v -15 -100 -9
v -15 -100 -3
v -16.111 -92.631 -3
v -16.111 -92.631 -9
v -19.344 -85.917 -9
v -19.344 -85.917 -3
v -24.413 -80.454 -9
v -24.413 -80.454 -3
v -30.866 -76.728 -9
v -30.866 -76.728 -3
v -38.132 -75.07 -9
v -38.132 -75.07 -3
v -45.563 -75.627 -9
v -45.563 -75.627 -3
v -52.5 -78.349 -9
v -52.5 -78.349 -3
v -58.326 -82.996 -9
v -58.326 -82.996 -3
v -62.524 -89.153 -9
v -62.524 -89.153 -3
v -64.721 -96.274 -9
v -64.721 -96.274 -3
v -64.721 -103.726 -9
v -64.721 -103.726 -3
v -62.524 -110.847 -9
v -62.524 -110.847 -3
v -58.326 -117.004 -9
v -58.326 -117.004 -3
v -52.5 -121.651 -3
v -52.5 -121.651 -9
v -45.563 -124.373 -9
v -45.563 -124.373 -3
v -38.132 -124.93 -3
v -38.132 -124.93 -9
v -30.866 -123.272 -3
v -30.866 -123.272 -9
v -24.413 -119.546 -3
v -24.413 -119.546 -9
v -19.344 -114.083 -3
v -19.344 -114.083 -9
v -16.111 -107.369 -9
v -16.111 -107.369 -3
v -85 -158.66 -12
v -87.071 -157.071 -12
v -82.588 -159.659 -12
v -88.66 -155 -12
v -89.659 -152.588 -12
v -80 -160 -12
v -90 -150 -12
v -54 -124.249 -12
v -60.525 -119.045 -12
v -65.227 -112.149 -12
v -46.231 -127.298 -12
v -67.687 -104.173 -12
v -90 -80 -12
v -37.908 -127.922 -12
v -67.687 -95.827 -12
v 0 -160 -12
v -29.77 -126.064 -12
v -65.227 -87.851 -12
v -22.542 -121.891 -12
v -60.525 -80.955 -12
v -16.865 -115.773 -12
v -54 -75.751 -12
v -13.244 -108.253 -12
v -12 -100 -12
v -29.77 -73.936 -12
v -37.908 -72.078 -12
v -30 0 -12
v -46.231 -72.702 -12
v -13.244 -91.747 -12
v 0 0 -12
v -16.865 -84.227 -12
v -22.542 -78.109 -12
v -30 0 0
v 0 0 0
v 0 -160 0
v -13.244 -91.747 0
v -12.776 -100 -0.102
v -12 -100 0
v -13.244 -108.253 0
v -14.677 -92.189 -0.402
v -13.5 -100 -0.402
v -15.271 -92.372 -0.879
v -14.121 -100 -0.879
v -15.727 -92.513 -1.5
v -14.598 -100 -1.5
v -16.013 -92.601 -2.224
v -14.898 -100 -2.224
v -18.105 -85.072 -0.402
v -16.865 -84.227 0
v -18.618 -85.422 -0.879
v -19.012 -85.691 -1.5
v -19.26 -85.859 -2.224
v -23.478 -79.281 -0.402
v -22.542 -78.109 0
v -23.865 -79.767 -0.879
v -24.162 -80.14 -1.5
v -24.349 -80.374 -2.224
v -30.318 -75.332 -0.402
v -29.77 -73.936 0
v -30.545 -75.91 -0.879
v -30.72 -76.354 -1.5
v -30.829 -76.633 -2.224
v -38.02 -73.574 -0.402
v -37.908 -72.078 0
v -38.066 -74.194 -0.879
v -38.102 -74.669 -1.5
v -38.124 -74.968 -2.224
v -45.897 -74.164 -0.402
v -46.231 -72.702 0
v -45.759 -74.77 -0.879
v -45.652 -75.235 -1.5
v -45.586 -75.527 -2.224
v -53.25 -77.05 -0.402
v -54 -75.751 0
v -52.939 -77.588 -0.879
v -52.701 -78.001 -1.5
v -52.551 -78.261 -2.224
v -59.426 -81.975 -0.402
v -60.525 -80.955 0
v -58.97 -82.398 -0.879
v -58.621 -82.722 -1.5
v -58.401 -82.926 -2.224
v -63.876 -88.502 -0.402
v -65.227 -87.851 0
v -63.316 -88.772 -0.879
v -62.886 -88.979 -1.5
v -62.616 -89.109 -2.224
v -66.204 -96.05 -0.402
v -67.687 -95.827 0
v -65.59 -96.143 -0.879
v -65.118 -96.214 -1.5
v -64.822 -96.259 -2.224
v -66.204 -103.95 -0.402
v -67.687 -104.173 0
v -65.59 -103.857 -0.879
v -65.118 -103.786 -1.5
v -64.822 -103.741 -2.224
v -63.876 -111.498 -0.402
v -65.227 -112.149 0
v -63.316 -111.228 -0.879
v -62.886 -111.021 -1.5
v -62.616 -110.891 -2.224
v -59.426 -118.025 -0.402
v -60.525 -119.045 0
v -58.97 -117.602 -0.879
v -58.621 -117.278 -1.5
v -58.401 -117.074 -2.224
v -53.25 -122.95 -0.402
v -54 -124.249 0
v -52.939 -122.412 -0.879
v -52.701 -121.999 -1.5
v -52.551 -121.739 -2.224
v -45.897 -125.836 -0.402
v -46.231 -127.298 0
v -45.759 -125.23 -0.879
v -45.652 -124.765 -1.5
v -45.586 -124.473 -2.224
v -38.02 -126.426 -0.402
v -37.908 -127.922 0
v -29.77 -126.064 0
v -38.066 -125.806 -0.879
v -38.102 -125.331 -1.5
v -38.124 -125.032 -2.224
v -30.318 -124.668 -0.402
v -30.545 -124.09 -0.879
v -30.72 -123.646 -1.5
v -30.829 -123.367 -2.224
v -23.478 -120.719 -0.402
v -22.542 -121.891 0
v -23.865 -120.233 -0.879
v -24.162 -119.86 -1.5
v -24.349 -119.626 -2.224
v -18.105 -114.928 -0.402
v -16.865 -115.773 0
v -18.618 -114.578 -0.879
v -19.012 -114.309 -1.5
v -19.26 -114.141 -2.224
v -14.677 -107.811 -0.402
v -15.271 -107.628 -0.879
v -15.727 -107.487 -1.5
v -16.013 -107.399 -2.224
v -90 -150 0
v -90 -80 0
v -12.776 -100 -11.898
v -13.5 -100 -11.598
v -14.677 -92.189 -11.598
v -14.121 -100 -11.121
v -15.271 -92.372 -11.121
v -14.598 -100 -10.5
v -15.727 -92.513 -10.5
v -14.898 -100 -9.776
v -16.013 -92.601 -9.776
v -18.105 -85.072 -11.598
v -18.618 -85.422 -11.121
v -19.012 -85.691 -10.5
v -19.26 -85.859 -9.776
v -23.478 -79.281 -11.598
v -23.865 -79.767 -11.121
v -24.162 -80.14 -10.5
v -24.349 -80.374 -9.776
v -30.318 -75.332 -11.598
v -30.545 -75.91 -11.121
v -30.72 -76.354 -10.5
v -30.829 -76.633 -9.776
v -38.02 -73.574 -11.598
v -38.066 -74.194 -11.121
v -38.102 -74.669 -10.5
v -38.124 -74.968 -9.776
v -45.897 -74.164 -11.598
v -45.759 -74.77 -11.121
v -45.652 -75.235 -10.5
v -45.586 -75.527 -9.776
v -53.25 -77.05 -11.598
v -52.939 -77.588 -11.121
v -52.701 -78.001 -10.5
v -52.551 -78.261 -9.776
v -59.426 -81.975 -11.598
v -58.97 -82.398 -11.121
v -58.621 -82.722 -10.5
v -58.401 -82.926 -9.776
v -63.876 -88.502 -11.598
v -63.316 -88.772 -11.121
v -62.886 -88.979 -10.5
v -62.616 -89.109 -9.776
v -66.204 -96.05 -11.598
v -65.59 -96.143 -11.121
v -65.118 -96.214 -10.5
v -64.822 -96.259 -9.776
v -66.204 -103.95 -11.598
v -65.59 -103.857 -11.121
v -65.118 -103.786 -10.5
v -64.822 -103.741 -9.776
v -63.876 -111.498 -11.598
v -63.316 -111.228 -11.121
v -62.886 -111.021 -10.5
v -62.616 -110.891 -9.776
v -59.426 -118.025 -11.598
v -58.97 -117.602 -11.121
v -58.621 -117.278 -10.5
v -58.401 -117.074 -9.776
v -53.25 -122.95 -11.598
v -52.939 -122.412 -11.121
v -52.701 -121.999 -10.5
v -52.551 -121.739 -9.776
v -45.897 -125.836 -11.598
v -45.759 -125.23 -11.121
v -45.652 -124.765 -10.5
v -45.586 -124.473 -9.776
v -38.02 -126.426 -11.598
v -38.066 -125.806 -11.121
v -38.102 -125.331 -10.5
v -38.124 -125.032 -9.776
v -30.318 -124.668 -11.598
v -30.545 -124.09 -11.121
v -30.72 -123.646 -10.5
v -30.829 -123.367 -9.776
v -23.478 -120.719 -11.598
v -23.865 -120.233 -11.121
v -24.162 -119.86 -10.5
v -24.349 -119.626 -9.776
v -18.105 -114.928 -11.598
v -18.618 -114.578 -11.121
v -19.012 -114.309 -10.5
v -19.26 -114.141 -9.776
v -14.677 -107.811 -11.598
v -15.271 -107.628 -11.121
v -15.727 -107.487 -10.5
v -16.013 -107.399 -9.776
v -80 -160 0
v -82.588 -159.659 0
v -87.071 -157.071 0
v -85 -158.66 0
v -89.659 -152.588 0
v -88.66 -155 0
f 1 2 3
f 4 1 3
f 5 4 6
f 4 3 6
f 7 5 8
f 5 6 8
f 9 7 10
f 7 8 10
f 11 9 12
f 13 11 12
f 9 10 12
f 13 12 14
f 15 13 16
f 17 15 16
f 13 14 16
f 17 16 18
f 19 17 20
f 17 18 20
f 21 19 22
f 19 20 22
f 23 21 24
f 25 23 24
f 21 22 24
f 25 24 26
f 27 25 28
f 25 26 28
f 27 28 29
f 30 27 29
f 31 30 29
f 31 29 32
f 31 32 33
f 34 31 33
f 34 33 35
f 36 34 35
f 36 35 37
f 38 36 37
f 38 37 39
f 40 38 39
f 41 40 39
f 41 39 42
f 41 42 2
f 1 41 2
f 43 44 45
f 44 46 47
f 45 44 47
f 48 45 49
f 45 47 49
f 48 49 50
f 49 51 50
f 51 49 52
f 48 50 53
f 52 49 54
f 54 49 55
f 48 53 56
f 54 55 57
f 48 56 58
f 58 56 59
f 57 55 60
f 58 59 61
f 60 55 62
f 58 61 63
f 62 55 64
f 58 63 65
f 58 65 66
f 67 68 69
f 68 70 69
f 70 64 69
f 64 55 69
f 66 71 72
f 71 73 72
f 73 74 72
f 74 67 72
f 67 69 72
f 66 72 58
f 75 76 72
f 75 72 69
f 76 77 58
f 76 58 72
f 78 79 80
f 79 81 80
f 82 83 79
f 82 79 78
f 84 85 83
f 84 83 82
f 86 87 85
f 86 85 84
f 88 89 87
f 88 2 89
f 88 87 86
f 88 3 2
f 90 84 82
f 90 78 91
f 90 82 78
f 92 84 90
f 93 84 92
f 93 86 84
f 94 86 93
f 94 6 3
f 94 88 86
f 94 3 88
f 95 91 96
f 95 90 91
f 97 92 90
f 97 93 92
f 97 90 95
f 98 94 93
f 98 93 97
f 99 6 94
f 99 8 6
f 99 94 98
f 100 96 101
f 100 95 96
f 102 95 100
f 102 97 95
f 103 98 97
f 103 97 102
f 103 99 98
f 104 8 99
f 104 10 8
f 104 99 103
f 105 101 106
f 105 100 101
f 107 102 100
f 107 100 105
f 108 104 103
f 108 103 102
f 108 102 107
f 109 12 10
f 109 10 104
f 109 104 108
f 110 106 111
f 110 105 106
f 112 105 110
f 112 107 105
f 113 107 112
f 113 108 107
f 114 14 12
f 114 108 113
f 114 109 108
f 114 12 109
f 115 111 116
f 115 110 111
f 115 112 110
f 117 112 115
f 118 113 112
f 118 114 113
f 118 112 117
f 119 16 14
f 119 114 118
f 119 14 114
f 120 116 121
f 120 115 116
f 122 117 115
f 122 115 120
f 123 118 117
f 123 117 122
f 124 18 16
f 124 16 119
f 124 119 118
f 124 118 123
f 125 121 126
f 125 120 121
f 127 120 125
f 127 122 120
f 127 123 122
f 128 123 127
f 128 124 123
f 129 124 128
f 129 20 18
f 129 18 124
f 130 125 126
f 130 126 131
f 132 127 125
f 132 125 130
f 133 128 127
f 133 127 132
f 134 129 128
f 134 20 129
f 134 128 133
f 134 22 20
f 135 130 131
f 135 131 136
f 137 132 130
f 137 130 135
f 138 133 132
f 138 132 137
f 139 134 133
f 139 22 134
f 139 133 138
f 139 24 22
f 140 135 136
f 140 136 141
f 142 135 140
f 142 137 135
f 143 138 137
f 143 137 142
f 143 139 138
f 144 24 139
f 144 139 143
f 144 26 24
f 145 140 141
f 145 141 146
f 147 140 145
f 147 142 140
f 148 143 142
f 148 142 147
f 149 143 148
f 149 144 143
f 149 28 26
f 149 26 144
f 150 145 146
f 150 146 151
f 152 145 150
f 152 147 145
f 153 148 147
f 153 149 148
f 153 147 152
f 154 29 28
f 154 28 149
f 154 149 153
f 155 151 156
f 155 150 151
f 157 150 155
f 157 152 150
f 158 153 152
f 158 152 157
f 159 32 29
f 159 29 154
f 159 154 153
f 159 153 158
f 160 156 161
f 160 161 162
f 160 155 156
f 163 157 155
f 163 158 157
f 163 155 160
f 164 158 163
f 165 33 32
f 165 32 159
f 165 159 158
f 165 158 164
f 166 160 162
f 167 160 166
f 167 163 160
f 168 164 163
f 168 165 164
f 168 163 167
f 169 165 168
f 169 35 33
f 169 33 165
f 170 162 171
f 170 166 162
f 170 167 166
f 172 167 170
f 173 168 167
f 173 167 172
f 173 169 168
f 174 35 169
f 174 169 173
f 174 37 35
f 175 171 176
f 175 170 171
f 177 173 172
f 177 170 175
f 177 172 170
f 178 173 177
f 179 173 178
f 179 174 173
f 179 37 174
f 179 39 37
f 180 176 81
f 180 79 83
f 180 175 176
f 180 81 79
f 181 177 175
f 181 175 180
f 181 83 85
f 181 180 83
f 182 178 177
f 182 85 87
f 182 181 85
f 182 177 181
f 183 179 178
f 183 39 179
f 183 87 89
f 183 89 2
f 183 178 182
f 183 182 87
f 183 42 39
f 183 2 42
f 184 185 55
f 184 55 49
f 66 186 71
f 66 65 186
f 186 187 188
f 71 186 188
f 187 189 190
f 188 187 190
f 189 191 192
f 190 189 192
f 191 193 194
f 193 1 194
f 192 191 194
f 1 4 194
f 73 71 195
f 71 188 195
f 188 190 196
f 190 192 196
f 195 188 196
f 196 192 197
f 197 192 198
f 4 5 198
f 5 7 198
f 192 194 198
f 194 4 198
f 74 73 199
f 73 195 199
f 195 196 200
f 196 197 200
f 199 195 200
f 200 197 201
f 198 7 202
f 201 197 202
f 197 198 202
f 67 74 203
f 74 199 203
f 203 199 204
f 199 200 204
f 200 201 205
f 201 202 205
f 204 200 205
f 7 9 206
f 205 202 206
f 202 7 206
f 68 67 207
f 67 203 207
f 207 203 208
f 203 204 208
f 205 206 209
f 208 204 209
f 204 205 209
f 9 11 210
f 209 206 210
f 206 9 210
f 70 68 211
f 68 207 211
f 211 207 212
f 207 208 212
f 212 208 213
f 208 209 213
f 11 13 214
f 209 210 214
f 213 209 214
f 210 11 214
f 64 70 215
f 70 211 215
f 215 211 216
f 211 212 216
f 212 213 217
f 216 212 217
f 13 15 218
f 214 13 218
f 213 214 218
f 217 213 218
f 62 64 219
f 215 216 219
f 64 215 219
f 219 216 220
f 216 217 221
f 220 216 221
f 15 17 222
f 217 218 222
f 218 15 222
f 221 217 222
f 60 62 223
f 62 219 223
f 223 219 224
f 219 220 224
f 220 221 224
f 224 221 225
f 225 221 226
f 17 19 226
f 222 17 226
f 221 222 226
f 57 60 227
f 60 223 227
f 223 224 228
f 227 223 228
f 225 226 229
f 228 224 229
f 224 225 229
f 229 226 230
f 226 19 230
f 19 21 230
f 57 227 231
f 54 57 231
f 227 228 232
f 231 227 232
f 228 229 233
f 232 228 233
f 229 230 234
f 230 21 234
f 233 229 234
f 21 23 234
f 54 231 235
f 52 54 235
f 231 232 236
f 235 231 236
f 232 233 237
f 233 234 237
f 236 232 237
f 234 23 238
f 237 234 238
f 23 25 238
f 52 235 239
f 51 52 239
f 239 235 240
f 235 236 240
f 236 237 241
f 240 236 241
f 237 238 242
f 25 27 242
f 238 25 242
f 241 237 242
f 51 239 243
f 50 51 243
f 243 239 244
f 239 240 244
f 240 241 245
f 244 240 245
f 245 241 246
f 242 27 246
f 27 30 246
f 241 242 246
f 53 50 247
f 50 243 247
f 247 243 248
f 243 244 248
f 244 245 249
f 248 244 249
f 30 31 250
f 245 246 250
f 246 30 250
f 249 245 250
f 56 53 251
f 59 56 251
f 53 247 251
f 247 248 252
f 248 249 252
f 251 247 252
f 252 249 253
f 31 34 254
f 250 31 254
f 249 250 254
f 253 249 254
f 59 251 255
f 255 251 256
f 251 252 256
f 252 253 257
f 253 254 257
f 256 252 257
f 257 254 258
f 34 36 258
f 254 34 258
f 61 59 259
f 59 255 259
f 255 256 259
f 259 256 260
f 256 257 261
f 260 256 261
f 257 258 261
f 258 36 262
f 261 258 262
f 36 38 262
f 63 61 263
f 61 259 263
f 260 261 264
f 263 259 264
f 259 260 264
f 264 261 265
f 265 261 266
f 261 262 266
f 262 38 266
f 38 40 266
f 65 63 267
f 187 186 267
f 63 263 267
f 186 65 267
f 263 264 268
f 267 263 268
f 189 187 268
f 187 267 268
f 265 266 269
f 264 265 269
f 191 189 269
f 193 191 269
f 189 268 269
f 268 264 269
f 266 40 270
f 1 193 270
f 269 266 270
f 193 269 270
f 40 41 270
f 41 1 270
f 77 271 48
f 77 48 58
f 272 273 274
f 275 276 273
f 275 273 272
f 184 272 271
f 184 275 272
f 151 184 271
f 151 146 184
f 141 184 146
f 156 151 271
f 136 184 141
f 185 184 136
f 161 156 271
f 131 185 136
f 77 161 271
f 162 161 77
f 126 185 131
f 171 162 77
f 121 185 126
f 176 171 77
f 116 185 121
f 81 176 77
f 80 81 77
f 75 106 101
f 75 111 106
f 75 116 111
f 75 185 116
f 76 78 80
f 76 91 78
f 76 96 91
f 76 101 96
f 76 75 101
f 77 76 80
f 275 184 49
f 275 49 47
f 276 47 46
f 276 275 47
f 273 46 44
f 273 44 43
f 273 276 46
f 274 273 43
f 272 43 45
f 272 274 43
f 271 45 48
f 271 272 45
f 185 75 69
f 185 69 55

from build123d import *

# Parameters (mm, degrees)
SM_BASE_FLANGE_1_DEPTH = 12
SKETCH_2_R             = 25
CUT_EXTRUDE_1_DEPTH    = 184.967388414
FILLET_1_R             = 3


# Sheet-metal steps are written as plain solids
with BuildPart() as part:
    # Sketch 1 → 基体-法兰1 (new body)
    with BuildSketch(Plane.XY):
        with BuildLine():
            Line((-30, 0), (-90, -80))
            Line((-90, -80), (-90, -150))
            ThreePointArc((-90, -150), (-87.071067812, -157.071067812), (-80, -160))
            Line((-80, -160), (0, -160))
            Line((0, -160), (0, 0))
            Line((0, 0), (-30, 0))
        make_face()
    extrude(amount=-SM_BASE_FLANGE_1_DEPTH)

    # Sketch 2 → 切除-拉伸1 (cut, through all)
    with BuildSketch(Plane.XY):
        with Locations((-40, -100)):
            Circle(SKETCH_2_R)
    extrude(amount=-CUT_EXTRUDE_1_DEPTH, mode=Mode.SUBTRACT)

    # 圆角1
    fillet_1_edges = [part.edges().sort_by_distance(p)[0] for p in [
        (-65, -100, -12),
        (-65, -100, 0),
    ]]
    fillet(fillet_1_edges, radius=FILLET_1_R)


solid = part.part
